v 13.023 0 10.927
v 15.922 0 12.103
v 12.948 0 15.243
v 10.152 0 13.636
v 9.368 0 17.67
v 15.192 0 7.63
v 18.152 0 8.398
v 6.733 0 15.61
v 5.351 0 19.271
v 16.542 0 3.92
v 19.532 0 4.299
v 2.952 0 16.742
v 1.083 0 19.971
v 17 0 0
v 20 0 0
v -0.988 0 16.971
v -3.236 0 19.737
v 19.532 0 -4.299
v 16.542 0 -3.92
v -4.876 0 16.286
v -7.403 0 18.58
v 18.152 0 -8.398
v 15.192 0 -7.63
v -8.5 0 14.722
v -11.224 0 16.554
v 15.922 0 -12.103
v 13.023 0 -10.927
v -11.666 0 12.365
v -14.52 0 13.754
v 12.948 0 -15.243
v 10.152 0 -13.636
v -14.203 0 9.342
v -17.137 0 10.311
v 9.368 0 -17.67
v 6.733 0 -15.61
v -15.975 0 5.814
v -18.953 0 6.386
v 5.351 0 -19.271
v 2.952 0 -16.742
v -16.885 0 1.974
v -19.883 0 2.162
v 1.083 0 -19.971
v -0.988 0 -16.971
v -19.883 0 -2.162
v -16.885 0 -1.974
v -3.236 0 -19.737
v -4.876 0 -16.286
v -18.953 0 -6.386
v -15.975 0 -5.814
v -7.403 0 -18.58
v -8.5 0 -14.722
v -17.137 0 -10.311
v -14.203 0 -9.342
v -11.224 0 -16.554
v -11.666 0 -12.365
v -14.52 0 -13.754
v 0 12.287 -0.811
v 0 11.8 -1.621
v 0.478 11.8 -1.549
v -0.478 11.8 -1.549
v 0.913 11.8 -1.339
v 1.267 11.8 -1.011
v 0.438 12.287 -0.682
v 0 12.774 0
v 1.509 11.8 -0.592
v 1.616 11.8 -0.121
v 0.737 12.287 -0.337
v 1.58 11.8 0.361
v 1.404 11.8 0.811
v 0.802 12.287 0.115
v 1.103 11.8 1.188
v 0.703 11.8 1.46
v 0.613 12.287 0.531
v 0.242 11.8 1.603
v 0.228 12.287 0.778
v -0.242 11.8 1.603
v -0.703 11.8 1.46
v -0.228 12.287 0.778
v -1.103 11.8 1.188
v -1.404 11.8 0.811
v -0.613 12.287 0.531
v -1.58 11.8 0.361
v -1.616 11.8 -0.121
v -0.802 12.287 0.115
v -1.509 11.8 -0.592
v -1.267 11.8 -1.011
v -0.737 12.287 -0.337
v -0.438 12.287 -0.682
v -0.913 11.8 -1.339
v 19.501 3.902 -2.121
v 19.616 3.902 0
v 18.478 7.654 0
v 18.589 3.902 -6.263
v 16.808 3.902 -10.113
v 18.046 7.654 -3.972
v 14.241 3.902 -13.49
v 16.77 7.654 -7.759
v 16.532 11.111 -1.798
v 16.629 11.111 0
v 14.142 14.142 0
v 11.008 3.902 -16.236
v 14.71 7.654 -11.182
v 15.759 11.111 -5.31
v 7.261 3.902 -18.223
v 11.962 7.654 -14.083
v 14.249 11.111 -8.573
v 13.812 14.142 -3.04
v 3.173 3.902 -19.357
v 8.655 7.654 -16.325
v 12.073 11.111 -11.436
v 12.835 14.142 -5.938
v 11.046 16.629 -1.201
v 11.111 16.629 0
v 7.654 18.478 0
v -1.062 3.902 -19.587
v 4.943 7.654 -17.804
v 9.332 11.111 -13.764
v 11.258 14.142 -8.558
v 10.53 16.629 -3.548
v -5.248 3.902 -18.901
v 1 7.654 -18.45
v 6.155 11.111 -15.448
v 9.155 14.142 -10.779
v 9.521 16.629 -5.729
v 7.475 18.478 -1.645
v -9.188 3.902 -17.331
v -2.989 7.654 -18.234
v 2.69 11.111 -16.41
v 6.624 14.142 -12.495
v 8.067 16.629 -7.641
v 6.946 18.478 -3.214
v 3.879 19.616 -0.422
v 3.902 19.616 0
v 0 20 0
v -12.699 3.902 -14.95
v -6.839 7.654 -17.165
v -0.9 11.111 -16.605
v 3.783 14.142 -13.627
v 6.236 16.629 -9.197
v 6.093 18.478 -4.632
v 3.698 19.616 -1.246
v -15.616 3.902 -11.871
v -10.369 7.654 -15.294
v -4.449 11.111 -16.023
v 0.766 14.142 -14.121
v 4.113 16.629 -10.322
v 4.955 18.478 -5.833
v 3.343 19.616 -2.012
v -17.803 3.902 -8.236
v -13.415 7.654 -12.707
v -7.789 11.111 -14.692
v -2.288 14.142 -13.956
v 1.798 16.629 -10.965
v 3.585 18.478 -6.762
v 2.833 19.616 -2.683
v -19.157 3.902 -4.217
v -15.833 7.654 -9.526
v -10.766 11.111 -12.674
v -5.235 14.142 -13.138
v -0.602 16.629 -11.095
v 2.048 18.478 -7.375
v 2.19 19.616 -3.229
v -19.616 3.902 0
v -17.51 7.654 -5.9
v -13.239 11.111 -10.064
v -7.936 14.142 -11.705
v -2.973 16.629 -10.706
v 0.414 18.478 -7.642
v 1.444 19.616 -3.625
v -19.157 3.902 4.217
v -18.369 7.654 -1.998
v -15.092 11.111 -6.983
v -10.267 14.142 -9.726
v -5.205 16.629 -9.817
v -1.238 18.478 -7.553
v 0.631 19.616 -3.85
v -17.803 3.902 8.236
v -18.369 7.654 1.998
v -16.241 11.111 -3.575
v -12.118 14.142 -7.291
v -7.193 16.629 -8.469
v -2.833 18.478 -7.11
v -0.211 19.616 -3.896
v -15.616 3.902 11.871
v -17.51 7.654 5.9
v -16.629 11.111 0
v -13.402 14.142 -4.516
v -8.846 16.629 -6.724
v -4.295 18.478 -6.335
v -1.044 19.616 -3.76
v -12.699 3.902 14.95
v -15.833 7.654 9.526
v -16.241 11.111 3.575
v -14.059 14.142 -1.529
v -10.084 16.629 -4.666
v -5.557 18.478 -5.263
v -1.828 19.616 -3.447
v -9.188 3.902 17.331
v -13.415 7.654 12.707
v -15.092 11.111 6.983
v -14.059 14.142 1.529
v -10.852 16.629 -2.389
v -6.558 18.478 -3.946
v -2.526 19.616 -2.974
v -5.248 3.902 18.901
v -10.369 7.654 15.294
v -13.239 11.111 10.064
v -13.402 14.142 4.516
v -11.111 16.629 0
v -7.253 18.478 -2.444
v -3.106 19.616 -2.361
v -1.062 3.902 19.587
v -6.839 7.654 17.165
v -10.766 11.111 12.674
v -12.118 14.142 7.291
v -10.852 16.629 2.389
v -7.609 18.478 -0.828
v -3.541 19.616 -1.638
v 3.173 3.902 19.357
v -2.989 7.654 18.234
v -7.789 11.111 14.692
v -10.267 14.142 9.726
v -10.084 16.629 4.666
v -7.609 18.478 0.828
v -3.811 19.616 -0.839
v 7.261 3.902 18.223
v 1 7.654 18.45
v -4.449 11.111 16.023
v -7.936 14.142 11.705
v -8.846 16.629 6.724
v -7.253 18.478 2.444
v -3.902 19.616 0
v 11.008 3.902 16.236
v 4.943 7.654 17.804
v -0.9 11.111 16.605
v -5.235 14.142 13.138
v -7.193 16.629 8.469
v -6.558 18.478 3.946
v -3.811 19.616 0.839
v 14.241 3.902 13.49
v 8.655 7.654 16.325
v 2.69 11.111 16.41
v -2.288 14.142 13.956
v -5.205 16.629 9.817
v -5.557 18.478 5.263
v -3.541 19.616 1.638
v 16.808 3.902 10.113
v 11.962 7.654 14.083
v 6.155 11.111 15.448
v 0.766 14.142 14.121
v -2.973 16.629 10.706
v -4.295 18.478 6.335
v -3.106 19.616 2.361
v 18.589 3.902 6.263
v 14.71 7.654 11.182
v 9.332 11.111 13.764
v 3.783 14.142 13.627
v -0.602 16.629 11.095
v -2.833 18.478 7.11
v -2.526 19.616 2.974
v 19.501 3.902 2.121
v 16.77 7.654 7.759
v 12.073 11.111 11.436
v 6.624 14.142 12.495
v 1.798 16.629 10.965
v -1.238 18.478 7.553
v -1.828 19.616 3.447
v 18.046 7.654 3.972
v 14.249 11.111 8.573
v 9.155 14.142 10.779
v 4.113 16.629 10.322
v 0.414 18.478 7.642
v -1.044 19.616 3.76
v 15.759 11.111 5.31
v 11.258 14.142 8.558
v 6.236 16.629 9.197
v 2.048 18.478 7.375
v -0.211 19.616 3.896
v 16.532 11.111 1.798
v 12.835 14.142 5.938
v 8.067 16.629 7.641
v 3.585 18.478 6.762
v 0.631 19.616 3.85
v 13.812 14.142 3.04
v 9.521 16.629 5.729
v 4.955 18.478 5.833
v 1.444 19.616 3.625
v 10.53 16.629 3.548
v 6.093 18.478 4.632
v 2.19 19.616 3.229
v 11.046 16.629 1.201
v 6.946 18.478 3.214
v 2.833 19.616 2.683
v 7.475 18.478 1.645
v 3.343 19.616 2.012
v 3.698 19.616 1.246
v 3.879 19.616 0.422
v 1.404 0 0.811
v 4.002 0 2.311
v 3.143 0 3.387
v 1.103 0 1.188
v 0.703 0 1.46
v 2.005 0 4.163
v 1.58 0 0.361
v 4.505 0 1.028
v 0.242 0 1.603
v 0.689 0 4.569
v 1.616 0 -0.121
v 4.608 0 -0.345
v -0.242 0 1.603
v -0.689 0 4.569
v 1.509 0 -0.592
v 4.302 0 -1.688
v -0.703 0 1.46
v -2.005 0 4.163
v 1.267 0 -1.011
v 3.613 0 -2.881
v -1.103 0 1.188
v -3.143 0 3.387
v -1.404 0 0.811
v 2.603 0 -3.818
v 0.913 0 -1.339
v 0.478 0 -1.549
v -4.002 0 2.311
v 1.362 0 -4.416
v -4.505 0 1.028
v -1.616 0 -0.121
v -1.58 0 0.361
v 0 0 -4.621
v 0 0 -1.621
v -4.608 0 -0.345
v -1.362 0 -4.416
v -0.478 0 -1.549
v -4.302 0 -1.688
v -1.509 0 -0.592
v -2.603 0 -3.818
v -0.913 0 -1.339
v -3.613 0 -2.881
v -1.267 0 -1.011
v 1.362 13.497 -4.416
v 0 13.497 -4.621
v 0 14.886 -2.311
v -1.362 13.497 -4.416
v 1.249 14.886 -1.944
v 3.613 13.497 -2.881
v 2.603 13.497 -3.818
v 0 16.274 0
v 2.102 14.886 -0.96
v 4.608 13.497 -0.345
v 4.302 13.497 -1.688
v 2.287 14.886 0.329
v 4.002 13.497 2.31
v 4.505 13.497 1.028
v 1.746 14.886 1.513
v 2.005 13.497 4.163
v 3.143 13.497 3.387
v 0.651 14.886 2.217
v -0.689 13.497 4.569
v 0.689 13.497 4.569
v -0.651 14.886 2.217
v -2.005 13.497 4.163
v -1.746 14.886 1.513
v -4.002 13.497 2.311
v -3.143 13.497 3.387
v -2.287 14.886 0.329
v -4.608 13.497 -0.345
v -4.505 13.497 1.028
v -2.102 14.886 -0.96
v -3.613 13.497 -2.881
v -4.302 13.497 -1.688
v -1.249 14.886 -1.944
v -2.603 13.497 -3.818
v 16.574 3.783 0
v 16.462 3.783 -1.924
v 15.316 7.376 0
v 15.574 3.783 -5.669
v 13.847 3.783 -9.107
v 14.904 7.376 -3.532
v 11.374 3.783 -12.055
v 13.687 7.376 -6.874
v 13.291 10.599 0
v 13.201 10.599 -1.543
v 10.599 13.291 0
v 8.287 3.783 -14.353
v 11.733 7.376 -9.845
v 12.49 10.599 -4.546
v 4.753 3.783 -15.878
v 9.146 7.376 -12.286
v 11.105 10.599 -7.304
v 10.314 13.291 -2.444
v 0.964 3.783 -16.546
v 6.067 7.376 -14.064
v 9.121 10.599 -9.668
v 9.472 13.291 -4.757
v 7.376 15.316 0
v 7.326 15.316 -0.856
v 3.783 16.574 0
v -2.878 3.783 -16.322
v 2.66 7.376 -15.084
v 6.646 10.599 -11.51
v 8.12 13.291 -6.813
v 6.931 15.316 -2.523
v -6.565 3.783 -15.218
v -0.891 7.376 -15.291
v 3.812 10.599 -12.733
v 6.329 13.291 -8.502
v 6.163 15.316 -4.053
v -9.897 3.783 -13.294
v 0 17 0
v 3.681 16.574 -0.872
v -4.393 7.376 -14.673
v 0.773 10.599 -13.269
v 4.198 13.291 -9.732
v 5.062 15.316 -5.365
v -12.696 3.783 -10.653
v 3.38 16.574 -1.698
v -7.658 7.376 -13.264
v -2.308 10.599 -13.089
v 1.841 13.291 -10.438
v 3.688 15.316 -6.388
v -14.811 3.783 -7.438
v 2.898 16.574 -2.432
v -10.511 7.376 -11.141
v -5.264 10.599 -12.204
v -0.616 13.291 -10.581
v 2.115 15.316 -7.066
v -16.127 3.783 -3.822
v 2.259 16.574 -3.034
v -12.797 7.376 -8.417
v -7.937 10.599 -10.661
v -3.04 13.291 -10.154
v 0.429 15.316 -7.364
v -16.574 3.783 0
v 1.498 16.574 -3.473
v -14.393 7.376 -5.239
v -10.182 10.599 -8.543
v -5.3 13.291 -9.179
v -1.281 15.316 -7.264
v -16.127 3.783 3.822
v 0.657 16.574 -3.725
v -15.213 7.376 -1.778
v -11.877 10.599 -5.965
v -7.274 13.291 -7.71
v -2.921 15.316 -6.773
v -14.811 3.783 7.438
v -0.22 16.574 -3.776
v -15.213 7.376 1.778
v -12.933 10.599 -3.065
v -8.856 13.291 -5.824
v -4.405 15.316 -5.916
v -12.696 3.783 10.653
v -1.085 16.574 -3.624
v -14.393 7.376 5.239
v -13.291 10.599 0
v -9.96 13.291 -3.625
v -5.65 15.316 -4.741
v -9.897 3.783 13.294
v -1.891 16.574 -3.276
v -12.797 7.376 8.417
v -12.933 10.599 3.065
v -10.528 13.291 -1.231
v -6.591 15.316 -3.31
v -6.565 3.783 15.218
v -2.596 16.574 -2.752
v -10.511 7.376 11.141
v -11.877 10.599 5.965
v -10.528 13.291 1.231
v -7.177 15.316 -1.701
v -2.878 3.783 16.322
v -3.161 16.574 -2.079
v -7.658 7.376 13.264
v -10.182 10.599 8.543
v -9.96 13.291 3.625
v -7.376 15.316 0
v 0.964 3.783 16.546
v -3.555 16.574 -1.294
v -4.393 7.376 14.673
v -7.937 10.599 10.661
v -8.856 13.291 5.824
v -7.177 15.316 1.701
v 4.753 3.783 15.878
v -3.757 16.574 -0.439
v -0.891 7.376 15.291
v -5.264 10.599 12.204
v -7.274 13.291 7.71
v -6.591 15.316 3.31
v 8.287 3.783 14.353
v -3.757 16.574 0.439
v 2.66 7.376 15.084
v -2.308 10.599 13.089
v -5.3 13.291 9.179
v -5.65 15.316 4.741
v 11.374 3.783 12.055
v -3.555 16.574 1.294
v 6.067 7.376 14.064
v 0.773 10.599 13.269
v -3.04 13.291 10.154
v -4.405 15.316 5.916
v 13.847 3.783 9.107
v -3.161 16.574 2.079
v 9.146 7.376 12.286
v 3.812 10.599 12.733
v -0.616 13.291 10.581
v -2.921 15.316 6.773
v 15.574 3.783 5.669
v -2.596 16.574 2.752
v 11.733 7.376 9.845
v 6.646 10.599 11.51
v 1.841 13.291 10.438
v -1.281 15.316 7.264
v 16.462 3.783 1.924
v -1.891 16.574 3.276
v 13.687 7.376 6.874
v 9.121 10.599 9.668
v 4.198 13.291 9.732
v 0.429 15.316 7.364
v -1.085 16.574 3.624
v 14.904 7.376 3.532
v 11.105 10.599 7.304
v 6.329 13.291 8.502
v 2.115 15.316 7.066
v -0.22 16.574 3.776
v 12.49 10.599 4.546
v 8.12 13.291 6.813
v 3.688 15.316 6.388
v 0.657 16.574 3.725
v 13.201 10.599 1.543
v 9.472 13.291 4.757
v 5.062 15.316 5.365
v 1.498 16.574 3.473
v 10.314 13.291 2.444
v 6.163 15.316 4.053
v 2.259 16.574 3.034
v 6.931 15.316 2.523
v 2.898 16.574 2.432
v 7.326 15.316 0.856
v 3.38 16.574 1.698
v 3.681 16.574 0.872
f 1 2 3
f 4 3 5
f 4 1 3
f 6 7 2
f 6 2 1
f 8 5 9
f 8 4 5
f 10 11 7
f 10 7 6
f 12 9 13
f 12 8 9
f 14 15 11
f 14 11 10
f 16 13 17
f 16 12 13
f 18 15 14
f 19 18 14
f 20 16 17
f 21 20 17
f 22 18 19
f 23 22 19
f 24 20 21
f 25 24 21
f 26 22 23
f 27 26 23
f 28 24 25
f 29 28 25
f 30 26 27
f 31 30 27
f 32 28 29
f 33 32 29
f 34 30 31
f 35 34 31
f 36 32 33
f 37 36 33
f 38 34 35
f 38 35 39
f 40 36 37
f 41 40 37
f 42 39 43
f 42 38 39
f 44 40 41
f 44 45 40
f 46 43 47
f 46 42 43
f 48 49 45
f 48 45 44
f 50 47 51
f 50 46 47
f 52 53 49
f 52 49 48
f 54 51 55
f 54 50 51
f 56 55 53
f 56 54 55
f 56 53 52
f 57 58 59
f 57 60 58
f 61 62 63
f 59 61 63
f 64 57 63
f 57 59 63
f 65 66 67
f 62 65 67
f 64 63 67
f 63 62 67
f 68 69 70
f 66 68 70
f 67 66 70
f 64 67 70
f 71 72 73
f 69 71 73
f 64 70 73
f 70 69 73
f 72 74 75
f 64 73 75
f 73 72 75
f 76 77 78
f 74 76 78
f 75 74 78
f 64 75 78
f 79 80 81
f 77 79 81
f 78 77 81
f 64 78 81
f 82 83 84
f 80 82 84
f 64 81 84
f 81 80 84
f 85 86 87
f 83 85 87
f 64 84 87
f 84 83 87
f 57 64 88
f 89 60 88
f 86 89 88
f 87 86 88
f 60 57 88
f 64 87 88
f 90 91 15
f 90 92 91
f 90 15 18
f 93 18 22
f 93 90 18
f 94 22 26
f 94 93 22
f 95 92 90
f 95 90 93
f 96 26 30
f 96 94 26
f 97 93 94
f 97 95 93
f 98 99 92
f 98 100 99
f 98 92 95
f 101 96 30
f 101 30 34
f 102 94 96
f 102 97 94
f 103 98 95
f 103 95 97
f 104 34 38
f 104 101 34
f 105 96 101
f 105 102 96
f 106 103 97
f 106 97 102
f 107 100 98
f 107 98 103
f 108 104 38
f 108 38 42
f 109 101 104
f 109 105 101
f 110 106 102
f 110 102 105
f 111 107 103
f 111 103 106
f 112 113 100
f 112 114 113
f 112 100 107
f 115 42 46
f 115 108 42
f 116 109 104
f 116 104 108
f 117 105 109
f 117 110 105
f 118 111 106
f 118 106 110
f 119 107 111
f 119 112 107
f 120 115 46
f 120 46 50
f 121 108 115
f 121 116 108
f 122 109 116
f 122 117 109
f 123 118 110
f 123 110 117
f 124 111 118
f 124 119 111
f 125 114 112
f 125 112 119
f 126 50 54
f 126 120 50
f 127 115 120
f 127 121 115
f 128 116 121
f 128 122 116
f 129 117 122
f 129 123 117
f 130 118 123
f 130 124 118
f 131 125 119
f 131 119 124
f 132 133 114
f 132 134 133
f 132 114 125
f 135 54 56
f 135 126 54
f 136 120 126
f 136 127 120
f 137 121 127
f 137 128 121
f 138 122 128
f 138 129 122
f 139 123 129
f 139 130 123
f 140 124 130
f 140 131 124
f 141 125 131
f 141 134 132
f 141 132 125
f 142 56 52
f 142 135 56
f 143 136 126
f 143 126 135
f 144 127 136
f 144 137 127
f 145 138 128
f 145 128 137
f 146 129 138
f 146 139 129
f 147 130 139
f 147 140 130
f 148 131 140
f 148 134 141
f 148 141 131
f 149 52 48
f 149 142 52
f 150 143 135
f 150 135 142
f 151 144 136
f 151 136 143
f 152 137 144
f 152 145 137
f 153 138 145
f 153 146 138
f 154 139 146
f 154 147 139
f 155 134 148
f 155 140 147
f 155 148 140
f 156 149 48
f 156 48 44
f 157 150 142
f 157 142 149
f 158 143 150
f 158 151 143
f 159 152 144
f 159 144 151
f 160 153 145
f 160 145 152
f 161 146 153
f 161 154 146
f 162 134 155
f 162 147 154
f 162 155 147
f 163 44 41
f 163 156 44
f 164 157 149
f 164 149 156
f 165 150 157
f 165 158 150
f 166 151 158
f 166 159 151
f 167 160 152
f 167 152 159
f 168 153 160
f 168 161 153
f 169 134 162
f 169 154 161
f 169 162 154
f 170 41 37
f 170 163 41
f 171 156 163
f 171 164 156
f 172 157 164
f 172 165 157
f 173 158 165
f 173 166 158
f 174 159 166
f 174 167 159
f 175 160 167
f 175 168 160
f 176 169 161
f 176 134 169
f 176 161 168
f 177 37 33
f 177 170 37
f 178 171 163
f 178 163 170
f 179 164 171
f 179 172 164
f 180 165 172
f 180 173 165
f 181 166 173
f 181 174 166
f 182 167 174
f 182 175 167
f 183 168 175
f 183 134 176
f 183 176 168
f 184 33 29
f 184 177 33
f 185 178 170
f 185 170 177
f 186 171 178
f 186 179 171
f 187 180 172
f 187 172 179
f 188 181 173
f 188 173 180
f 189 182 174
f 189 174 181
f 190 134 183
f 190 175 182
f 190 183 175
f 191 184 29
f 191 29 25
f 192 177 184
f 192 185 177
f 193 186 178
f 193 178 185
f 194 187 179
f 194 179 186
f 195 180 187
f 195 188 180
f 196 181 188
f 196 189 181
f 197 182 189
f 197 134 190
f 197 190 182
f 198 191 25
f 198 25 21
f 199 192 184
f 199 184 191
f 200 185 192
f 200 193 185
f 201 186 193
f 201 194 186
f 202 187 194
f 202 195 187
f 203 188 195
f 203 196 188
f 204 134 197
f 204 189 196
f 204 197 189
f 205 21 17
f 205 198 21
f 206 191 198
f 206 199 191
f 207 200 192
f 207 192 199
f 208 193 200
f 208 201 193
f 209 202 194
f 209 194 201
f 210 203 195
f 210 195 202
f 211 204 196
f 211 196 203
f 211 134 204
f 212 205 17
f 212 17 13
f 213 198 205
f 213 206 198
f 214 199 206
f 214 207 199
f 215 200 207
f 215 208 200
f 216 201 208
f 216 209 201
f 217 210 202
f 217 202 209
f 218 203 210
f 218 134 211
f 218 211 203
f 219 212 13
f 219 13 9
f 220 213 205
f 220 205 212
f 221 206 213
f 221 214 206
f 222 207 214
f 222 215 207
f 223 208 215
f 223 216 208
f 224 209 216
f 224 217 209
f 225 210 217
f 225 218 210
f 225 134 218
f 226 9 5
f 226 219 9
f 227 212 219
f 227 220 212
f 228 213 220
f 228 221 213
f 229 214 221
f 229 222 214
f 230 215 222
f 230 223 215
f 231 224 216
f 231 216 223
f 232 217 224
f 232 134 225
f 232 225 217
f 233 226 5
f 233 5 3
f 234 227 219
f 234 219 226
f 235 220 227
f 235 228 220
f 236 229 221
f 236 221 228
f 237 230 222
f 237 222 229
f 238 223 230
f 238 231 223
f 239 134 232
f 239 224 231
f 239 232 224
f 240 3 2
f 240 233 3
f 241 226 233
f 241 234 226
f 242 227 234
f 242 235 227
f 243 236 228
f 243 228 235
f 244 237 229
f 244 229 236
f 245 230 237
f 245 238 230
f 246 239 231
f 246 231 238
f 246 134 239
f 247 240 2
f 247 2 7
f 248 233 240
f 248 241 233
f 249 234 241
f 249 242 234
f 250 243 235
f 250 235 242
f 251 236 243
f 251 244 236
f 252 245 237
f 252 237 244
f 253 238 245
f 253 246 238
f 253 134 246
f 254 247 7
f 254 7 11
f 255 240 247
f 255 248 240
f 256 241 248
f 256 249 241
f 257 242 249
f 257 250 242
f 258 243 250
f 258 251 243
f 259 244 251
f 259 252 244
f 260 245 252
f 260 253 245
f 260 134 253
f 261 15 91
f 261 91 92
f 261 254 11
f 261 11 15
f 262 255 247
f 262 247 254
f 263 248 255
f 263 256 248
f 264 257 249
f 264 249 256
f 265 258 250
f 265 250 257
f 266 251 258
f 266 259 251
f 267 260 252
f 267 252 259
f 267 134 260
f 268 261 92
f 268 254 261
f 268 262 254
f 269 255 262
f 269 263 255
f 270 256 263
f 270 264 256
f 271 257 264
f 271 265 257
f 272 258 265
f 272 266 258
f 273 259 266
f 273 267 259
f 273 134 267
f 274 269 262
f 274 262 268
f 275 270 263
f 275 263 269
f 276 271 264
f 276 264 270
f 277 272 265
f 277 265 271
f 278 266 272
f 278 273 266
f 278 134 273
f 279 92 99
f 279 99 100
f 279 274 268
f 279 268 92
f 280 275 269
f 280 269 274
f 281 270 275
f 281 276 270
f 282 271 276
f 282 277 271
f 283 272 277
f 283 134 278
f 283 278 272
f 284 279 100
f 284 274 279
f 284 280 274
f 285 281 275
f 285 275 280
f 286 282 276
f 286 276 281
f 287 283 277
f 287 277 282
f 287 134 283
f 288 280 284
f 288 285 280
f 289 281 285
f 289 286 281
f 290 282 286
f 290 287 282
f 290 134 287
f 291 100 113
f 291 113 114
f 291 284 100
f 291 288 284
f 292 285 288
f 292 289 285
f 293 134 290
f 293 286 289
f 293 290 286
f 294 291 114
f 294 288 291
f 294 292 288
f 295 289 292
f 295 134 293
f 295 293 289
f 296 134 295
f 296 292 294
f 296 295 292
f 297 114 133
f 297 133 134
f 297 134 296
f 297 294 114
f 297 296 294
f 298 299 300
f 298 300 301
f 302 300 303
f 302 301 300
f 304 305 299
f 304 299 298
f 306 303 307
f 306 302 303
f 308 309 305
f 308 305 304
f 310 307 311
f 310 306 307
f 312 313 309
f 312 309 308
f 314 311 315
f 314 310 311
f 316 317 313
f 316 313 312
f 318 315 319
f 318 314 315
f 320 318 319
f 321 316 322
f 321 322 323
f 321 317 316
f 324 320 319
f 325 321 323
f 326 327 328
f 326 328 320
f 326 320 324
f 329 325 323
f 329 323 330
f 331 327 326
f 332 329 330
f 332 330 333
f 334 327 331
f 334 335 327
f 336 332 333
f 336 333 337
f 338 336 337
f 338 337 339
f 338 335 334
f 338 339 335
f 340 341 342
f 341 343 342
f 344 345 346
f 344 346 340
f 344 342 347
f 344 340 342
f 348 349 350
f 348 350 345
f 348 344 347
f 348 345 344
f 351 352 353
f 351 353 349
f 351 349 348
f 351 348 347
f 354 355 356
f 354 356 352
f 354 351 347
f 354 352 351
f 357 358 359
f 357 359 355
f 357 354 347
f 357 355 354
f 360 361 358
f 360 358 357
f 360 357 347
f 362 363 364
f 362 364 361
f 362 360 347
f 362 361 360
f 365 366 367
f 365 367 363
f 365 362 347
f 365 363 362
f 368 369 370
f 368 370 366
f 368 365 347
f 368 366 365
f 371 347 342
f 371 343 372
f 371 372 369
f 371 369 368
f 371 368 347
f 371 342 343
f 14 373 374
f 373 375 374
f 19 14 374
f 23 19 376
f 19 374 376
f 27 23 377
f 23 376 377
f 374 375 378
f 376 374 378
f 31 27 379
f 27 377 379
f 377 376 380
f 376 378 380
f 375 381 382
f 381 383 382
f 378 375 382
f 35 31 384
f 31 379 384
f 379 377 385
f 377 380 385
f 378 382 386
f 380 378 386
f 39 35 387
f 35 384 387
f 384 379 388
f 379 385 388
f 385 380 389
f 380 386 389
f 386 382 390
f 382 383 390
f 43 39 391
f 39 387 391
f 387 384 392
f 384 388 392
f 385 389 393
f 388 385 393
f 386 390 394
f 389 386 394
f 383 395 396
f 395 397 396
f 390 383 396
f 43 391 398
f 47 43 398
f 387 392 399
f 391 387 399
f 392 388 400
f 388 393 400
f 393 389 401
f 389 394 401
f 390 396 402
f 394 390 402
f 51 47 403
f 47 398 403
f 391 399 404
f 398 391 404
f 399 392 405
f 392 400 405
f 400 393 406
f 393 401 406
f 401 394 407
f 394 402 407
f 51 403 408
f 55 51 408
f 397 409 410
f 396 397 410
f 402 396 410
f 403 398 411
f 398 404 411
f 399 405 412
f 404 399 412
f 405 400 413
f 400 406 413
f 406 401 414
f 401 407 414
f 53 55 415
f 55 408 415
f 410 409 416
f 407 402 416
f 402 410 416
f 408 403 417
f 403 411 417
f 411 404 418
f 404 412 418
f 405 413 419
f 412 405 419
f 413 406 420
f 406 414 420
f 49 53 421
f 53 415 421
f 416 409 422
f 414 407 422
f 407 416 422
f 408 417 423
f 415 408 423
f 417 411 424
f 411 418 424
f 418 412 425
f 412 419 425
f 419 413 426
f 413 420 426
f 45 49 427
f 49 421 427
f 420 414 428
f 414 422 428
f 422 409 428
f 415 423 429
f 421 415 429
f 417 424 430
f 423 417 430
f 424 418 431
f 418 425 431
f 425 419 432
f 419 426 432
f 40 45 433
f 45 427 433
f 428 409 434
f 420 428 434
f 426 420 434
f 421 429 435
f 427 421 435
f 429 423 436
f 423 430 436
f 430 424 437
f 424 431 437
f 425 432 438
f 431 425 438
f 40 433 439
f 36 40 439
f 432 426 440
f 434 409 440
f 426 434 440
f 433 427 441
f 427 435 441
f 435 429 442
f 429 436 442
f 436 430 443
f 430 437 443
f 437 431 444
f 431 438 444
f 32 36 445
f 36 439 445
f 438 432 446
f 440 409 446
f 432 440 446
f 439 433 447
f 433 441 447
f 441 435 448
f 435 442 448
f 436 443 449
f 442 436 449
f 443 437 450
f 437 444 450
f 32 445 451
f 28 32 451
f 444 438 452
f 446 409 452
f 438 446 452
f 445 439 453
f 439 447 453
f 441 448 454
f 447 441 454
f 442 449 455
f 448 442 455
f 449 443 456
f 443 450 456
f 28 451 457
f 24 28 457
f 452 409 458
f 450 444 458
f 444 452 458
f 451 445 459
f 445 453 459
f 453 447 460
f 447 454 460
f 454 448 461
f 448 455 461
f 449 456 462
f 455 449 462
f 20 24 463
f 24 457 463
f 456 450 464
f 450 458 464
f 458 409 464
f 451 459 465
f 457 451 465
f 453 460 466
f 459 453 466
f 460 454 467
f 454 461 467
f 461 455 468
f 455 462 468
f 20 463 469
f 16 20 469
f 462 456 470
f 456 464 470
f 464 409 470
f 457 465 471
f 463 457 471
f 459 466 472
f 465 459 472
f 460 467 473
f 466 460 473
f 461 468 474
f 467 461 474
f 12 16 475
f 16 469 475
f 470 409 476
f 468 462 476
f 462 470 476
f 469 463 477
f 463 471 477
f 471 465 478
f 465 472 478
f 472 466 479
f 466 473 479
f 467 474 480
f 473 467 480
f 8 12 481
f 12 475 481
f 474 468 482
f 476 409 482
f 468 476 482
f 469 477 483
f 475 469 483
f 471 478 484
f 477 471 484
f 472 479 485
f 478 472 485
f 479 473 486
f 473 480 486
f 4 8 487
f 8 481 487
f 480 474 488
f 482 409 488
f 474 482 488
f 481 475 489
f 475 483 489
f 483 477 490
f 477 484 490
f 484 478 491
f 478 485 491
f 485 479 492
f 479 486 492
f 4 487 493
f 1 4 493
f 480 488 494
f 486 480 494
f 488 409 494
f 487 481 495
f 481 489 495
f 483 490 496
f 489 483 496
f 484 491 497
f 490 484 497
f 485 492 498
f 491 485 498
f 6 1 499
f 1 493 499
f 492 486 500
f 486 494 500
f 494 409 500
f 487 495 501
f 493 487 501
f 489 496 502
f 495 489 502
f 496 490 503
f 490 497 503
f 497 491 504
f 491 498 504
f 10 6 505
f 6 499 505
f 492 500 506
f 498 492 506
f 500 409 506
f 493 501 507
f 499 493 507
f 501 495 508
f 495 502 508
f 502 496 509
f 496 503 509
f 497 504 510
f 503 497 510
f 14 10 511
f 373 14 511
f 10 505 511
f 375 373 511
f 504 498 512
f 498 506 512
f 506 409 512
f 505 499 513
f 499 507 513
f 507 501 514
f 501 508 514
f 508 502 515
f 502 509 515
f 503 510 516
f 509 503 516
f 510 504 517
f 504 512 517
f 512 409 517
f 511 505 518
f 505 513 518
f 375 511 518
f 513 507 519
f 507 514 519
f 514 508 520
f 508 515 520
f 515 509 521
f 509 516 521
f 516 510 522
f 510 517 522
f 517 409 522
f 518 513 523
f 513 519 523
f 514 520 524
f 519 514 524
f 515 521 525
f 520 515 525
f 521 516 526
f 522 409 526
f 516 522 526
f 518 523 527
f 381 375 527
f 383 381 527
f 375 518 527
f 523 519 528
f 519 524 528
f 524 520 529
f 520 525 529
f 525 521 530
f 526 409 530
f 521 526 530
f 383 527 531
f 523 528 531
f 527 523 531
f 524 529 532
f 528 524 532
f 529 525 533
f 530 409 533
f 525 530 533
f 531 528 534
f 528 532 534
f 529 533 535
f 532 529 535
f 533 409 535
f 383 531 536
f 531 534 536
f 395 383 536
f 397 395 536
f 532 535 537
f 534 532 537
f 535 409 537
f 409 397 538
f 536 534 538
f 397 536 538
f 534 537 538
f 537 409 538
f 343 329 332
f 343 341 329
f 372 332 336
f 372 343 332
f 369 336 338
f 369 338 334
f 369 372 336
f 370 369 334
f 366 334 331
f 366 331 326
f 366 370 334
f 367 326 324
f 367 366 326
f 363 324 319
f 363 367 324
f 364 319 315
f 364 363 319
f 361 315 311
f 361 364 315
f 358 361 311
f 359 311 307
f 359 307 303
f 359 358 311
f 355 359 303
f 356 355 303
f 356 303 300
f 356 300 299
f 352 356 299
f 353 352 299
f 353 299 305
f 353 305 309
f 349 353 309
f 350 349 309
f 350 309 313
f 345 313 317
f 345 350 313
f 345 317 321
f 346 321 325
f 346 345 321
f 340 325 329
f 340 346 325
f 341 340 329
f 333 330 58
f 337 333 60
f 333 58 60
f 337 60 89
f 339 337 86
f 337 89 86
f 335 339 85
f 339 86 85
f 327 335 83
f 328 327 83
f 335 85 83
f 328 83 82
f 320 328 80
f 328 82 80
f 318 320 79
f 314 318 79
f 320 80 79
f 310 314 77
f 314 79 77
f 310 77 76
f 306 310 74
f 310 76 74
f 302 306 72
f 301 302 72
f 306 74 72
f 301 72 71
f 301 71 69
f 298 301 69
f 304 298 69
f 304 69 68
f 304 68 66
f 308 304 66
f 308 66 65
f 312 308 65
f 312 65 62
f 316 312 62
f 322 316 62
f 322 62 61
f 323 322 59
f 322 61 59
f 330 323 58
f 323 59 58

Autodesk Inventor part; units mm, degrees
ref_plane "YZ Plane" through (0, 0, 0) normal (1, 0, 0) x (0, 1, 0)
ref_plane "XZ Plane" through (0, 0, 0) normal (0, 1, 0) x (-1, 0, 0)
ref_plane "XY Plane" through (0, 0, 0) normal (0, 0, 1) x (1, 0, 0)
sketch "Sketch1" plane through (0, 0, 0) normal (0, 0, 1) x (1, 0, 0)
  line L0 (0, 0) -> (0, 20)
  line L1 (0, 0) -> (20, 0)
  arc A0 (20, 0) -> (0, 20) centre (0, 0) ccw
  line L2 (0, -4.8284) -> (0, 28.9706) projected
  dimension "d2" = 20
revolve "Revolution1" add sketch "Sketch1" angle 360 about axis through (0, -10, 0) along (0, 1, 0)
sketch "Sketch4" plane through (0, 0, 0) normal (0, -1, 0) x (1, 0, 0)
  point P0 (0, 0)
  point P1 (0, 0)
hole "Hole2" at (0, 0, 0) direction (0, 1, 0) diameter 3.242 depth 11.8 tip angle 118 thread size "M4x0.7" class "6H" standard "ANSI Metric M Profile"
shell "Shell2" thickness 3 removed faces 1 at (13.676, 0, 1.6606)
properties part number "Ball_Upper Half" material "Nylon 6/6"
